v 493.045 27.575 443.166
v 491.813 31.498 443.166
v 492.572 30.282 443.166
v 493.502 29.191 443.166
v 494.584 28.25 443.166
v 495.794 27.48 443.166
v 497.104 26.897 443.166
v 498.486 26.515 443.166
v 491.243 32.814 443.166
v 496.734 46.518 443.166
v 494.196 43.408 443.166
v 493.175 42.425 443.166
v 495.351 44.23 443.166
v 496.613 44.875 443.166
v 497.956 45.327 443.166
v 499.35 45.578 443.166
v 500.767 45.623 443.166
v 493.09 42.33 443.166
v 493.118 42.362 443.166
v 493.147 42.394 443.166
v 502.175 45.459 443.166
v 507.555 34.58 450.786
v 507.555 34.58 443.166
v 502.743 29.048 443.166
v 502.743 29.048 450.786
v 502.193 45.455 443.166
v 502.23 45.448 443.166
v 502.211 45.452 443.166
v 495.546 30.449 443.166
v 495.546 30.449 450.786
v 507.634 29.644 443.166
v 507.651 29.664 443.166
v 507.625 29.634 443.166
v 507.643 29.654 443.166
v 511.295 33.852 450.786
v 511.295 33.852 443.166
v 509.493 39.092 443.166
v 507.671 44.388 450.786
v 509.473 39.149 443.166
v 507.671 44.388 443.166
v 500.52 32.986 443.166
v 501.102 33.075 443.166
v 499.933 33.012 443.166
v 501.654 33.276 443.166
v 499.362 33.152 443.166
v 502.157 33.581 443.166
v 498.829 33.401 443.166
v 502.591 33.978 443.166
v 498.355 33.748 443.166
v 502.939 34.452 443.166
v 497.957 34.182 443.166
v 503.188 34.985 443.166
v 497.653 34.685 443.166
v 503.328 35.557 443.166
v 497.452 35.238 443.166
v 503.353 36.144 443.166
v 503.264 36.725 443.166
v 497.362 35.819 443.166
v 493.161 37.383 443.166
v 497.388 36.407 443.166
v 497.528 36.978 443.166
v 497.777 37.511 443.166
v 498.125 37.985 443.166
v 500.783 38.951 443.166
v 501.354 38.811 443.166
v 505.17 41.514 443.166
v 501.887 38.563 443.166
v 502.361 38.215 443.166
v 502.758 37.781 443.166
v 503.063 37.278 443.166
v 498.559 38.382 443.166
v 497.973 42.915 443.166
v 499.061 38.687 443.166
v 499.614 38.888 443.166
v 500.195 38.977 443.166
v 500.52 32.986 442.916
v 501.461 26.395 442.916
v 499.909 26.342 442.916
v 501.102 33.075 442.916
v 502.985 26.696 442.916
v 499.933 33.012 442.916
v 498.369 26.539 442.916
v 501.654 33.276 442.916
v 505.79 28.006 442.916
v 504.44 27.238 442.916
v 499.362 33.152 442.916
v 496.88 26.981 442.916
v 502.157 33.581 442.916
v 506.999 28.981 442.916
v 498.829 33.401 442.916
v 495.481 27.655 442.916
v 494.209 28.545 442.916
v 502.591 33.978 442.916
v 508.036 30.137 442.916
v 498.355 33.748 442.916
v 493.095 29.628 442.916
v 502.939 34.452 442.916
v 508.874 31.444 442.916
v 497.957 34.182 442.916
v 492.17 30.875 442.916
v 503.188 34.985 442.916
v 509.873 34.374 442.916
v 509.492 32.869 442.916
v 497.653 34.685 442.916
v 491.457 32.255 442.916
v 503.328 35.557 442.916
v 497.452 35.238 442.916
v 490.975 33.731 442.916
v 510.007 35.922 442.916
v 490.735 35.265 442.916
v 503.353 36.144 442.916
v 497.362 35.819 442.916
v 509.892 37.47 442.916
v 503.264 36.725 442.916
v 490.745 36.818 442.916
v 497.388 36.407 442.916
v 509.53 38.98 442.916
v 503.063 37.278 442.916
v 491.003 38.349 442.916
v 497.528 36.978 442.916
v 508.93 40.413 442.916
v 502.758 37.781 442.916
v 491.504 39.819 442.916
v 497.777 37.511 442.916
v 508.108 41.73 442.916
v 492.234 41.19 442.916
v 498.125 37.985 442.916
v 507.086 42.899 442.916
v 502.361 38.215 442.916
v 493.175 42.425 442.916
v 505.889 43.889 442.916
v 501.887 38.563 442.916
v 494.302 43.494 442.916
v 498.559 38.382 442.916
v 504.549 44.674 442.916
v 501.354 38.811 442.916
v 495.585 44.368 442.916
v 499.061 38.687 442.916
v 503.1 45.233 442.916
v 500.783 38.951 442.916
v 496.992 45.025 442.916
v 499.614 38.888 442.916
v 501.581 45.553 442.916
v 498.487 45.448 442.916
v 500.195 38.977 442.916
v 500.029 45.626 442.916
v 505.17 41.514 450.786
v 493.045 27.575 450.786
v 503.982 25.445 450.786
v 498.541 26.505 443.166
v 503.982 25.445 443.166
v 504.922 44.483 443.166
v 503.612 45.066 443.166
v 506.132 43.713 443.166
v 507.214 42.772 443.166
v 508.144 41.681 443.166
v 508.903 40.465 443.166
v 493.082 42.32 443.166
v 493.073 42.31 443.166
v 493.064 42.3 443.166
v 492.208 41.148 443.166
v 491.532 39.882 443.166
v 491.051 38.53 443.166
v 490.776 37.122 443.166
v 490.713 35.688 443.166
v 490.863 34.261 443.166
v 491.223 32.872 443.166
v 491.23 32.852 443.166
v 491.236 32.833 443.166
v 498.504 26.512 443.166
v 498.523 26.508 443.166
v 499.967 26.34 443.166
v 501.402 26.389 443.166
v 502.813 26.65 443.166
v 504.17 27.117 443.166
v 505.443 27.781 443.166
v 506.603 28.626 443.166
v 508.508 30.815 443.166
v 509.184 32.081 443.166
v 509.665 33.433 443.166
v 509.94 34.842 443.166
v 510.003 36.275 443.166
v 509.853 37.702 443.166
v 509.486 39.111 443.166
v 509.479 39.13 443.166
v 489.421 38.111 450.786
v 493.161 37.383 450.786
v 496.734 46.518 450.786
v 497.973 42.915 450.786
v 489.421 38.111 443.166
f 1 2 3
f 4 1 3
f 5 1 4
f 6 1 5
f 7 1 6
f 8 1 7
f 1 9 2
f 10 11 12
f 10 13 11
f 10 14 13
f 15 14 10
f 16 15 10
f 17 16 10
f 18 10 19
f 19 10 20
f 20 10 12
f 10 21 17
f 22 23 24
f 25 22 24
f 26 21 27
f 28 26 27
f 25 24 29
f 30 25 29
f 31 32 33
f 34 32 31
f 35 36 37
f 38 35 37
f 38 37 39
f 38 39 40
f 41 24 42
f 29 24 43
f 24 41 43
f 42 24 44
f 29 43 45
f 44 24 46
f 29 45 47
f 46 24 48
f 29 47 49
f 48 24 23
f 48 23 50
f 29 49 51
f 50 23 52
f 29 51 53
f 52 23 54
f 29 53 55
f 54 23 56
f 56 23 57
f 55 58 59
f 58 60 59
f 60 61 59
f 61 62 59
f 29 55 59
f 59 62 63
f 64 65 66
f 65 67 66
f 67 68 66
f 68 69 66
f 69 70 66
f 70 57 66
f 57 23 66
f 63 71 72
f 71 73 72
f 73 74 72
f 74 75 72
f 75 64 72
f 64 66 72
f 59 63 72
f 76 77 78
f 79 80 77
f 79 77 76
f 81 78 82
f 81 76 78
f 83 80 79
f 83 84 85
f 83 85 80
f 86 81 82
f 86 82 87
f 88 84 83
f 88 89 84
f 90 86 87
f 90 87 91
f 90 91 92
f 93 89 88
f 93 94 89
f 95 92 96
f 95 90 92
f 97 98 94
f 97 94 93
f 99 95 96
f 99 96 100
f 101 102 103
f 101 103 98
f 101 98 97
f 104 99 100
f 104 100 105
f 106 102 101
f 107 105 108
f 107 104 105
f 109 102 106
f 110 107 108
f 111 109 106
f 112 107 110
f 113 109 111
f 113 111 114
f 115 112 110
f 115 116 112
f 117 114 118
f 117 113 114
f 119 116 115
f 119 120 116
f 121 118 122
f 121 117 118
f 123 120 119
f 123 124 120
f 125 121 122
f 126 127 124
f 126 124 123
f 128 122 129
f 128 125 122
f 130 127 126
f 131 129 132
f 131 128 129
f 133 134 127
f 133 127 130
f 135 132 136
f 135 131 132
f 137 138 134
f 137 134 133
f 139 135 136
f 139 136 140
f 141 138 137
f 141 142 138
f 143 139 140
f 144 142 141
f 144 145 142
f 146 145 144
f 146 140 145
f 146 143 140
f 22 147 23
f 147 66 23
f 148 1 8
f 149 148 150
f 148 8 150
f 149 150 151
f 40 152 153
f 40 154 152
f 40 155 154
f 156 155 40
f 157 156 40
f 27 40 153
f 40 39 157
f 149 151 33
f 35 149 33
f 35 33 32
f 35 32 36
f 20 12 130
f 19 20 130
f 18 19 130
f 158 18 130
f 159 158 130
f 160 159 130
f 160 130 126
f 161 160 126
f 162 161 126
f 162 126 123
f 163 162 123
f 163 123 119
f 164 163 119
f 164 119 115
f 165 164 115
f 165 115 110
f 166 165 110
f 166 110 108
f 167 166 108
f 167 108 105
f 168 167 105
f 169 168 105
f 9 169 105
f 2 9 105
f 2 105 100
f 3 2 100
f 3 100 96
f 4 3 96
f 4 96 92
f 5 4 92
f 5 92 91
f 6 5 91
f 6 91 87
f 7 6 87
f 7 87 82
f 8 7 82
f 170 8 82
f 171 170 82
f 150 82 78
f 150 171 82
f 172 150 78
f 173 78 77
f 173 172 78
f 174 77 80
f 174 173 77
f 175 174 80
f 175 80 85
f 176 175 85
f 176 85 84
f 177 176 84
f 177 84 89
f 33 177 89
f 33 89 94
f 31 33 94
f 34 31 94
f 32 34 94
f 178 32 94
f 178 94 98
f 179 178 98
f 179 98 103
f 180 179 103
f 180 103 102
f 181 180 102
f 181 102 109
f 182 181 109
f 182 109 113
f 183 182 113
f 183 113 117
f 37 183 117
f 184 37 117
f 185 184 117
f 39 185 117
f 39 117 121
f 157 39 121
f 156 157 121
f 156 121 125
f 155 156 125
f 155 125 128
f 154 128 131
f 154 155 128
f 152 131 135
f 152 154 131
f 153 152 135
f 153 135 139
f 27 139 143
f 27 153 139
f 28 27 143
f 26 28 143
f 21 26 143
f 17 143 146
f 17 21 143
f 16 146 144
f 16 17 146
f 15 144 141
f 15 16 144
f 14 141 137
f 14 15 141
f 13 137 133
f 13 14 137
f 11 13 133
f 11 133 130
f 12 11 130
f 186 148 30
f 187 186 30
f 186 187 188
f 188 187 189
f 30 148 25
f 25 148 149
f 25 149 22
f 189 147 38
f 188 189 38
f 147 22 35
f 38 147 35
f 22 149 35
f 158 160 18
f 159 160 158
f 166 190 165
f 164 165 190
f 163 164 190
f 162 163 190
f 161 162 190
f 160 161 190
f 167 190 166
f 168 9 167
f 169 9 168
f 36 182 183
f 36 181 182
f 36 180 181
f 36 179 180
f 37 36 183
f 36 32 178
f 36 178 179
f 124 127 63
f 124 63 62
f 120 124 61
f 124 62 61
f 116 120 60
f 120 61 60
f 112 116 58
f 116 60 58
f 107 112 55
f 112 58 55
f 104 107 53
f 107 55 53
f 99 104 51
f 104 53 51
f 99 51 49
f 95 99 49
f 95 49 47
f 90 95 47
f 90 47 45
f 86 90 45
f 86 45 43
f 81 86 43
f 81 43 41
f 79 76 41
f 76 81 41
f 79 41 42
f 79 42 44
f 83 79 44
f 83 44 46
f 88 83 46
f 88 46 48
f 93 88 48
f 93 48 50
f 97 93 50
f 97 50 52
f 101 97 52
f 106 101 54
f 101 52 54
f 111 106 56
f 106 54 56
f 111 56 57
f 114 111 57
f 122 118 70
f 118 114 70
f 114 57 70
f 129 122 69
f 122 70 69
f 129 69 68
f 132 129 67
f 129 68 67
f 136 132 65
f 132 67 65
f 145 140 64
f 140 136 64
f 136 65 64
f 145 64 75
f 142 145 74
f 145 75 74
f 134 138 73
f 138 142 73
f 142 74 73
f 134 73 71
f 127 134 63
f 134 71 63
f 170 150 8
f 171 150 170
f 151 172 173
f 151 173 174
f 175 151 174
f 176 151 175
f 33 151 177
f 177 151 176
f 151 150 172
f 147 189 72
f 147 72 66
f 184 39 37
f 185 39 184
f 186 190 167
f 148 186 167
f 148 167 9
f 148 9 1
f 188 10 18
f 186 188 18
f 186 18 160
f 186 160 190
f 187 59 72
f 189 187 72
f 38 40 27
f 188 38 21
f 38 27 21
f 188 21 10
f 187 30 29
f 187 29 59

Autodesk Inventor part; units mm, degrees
ref_plane "YZ Plane" through (0, 0, 0) normal (1, 0, 0) x (0, 1, 0)
ref_plane "XZ Plane" through (0, 0, 0) normal (0, 1, 0) x (-1, 0, 0)
ref_plane "XY Plane" through (0, 0, 0) normal (0, 0, 1) x (1, 0, 0)
ref_plane "Work Plane1" through (500.3579, 35.9816, 443.1665) normal (0, 0, -1) x (0.6678, 0.7444, 0)
sketch "Sketch2" plane through (500.3579, 35.9816, 443.1665) normal (0, 0, -1) x (0.6678, 0.7444, 0)
  line L0 (3.7629, 6.2932) -> (-3.5686, 6.4054) projected
  line L1 (-3.5686, 6.4054) -> (-7.3315, 0.1122) projected
  line L2 (-7.3315, 0.1122) -> (-3.7629, -6.2932) projected
  line L3 (-3.7629, -6.2932) -> (3.5686, -6.4054) projected
  line L4 (3.5686, -6.4054) -> (7.3315, -0.1122) projected
  line L5 (7.3315, -0.1122) -> (3.7629, 6.2932) projected
  line L6 (-7.3315, 0.1122) -> (7.3315, -0.1122)
  line L7 (3.7629, 6.2932) -> (-3.7629, -6.2932)
  line L8 (-3.5686, 6.4054) -> (3.5686, -6.4054)
  line L9 (-3.5686, 6.4054) -> (-5.4229, 9.7337)
  line L10 (-5.4229, 9.7337) -> (5.7182, 9.5632)
  line L11 (5.7182, 9.5632) -> (11.141, -0.1705)
  line L12 (11.141, -0.1705) -> (5.4229, -9.7337)
  line L13 (5.4229, -9.7337) -> (-5.7182, -9.5632)
  line L14 (-5.7182, -9.5632) -> (-11.141, 0.1705)
  line L15 (-11.141, 0.1705) -> (-5.4229, 9.7337)
  point P0 (-360.9105, -348.4198)
  point P1 (0, 0)
  dimension "d0" = 3.81
extrude "Extrusion1" add sketch "Sketch2" against normal blind 7.62
sketch "Sketch3" plane through (500.3579, 35.9816, 443.1665) normal (0, 0, -1) x (-0.7444, 0.6678, 0)
  line L0 (-6.2932, 3.7629) -> (0.1122, 7.3315) projected
  line L1 (0.1122, 7.3315) -> (6.4054, 3.5686) projected
  line L2 (6.4054, 3.5686) -> (6.2932, -3.7629) projected
  line L3 (6.2932, -3.7629) -> (-0.1122, -7.3315) projected
  line L4 (-0.1122, -7.3315) -> (-6.4054, -3.5686) projected
  line L5 (-6.4054, -3.5686) -> (-6.2932, 3.7629) projected
  line L6 (-9.7337, -5.4229) -> (-0.1705, -11.141) projected
  line L7 (-0.1705, -11.141) -> (9.5632, -5.7182) projected
  line L8 (9.5632, -5.7182) -> (9.7337, 5.4229) projected
  line L9 (9.7337, 5.4229) -> (0.1705, 11.141) projected
  line L10 (0.1705, 11.141) -> (-9.5632, 5.7182) projected
  line L11 (-9.5632, 5.7182) -> (-9.7337, -5.4229) projected
  point P0 (348.4198, -360.9105)
sketch "Sketch4" plane through (500.3579, 35.9816, 443.1665) normal (0, 0, -1) x (-0.7444, 0.6678, 0)
  circle A0 centre (0, 0) radius 9.6496
  circle A1 centre (0, 0) radius 3
  point P0 (348.4198, -360.9105)
  dimension "d3" = 6
extrude "Extrusion2" add sketch "Sketch4" along normal blind 0.25
